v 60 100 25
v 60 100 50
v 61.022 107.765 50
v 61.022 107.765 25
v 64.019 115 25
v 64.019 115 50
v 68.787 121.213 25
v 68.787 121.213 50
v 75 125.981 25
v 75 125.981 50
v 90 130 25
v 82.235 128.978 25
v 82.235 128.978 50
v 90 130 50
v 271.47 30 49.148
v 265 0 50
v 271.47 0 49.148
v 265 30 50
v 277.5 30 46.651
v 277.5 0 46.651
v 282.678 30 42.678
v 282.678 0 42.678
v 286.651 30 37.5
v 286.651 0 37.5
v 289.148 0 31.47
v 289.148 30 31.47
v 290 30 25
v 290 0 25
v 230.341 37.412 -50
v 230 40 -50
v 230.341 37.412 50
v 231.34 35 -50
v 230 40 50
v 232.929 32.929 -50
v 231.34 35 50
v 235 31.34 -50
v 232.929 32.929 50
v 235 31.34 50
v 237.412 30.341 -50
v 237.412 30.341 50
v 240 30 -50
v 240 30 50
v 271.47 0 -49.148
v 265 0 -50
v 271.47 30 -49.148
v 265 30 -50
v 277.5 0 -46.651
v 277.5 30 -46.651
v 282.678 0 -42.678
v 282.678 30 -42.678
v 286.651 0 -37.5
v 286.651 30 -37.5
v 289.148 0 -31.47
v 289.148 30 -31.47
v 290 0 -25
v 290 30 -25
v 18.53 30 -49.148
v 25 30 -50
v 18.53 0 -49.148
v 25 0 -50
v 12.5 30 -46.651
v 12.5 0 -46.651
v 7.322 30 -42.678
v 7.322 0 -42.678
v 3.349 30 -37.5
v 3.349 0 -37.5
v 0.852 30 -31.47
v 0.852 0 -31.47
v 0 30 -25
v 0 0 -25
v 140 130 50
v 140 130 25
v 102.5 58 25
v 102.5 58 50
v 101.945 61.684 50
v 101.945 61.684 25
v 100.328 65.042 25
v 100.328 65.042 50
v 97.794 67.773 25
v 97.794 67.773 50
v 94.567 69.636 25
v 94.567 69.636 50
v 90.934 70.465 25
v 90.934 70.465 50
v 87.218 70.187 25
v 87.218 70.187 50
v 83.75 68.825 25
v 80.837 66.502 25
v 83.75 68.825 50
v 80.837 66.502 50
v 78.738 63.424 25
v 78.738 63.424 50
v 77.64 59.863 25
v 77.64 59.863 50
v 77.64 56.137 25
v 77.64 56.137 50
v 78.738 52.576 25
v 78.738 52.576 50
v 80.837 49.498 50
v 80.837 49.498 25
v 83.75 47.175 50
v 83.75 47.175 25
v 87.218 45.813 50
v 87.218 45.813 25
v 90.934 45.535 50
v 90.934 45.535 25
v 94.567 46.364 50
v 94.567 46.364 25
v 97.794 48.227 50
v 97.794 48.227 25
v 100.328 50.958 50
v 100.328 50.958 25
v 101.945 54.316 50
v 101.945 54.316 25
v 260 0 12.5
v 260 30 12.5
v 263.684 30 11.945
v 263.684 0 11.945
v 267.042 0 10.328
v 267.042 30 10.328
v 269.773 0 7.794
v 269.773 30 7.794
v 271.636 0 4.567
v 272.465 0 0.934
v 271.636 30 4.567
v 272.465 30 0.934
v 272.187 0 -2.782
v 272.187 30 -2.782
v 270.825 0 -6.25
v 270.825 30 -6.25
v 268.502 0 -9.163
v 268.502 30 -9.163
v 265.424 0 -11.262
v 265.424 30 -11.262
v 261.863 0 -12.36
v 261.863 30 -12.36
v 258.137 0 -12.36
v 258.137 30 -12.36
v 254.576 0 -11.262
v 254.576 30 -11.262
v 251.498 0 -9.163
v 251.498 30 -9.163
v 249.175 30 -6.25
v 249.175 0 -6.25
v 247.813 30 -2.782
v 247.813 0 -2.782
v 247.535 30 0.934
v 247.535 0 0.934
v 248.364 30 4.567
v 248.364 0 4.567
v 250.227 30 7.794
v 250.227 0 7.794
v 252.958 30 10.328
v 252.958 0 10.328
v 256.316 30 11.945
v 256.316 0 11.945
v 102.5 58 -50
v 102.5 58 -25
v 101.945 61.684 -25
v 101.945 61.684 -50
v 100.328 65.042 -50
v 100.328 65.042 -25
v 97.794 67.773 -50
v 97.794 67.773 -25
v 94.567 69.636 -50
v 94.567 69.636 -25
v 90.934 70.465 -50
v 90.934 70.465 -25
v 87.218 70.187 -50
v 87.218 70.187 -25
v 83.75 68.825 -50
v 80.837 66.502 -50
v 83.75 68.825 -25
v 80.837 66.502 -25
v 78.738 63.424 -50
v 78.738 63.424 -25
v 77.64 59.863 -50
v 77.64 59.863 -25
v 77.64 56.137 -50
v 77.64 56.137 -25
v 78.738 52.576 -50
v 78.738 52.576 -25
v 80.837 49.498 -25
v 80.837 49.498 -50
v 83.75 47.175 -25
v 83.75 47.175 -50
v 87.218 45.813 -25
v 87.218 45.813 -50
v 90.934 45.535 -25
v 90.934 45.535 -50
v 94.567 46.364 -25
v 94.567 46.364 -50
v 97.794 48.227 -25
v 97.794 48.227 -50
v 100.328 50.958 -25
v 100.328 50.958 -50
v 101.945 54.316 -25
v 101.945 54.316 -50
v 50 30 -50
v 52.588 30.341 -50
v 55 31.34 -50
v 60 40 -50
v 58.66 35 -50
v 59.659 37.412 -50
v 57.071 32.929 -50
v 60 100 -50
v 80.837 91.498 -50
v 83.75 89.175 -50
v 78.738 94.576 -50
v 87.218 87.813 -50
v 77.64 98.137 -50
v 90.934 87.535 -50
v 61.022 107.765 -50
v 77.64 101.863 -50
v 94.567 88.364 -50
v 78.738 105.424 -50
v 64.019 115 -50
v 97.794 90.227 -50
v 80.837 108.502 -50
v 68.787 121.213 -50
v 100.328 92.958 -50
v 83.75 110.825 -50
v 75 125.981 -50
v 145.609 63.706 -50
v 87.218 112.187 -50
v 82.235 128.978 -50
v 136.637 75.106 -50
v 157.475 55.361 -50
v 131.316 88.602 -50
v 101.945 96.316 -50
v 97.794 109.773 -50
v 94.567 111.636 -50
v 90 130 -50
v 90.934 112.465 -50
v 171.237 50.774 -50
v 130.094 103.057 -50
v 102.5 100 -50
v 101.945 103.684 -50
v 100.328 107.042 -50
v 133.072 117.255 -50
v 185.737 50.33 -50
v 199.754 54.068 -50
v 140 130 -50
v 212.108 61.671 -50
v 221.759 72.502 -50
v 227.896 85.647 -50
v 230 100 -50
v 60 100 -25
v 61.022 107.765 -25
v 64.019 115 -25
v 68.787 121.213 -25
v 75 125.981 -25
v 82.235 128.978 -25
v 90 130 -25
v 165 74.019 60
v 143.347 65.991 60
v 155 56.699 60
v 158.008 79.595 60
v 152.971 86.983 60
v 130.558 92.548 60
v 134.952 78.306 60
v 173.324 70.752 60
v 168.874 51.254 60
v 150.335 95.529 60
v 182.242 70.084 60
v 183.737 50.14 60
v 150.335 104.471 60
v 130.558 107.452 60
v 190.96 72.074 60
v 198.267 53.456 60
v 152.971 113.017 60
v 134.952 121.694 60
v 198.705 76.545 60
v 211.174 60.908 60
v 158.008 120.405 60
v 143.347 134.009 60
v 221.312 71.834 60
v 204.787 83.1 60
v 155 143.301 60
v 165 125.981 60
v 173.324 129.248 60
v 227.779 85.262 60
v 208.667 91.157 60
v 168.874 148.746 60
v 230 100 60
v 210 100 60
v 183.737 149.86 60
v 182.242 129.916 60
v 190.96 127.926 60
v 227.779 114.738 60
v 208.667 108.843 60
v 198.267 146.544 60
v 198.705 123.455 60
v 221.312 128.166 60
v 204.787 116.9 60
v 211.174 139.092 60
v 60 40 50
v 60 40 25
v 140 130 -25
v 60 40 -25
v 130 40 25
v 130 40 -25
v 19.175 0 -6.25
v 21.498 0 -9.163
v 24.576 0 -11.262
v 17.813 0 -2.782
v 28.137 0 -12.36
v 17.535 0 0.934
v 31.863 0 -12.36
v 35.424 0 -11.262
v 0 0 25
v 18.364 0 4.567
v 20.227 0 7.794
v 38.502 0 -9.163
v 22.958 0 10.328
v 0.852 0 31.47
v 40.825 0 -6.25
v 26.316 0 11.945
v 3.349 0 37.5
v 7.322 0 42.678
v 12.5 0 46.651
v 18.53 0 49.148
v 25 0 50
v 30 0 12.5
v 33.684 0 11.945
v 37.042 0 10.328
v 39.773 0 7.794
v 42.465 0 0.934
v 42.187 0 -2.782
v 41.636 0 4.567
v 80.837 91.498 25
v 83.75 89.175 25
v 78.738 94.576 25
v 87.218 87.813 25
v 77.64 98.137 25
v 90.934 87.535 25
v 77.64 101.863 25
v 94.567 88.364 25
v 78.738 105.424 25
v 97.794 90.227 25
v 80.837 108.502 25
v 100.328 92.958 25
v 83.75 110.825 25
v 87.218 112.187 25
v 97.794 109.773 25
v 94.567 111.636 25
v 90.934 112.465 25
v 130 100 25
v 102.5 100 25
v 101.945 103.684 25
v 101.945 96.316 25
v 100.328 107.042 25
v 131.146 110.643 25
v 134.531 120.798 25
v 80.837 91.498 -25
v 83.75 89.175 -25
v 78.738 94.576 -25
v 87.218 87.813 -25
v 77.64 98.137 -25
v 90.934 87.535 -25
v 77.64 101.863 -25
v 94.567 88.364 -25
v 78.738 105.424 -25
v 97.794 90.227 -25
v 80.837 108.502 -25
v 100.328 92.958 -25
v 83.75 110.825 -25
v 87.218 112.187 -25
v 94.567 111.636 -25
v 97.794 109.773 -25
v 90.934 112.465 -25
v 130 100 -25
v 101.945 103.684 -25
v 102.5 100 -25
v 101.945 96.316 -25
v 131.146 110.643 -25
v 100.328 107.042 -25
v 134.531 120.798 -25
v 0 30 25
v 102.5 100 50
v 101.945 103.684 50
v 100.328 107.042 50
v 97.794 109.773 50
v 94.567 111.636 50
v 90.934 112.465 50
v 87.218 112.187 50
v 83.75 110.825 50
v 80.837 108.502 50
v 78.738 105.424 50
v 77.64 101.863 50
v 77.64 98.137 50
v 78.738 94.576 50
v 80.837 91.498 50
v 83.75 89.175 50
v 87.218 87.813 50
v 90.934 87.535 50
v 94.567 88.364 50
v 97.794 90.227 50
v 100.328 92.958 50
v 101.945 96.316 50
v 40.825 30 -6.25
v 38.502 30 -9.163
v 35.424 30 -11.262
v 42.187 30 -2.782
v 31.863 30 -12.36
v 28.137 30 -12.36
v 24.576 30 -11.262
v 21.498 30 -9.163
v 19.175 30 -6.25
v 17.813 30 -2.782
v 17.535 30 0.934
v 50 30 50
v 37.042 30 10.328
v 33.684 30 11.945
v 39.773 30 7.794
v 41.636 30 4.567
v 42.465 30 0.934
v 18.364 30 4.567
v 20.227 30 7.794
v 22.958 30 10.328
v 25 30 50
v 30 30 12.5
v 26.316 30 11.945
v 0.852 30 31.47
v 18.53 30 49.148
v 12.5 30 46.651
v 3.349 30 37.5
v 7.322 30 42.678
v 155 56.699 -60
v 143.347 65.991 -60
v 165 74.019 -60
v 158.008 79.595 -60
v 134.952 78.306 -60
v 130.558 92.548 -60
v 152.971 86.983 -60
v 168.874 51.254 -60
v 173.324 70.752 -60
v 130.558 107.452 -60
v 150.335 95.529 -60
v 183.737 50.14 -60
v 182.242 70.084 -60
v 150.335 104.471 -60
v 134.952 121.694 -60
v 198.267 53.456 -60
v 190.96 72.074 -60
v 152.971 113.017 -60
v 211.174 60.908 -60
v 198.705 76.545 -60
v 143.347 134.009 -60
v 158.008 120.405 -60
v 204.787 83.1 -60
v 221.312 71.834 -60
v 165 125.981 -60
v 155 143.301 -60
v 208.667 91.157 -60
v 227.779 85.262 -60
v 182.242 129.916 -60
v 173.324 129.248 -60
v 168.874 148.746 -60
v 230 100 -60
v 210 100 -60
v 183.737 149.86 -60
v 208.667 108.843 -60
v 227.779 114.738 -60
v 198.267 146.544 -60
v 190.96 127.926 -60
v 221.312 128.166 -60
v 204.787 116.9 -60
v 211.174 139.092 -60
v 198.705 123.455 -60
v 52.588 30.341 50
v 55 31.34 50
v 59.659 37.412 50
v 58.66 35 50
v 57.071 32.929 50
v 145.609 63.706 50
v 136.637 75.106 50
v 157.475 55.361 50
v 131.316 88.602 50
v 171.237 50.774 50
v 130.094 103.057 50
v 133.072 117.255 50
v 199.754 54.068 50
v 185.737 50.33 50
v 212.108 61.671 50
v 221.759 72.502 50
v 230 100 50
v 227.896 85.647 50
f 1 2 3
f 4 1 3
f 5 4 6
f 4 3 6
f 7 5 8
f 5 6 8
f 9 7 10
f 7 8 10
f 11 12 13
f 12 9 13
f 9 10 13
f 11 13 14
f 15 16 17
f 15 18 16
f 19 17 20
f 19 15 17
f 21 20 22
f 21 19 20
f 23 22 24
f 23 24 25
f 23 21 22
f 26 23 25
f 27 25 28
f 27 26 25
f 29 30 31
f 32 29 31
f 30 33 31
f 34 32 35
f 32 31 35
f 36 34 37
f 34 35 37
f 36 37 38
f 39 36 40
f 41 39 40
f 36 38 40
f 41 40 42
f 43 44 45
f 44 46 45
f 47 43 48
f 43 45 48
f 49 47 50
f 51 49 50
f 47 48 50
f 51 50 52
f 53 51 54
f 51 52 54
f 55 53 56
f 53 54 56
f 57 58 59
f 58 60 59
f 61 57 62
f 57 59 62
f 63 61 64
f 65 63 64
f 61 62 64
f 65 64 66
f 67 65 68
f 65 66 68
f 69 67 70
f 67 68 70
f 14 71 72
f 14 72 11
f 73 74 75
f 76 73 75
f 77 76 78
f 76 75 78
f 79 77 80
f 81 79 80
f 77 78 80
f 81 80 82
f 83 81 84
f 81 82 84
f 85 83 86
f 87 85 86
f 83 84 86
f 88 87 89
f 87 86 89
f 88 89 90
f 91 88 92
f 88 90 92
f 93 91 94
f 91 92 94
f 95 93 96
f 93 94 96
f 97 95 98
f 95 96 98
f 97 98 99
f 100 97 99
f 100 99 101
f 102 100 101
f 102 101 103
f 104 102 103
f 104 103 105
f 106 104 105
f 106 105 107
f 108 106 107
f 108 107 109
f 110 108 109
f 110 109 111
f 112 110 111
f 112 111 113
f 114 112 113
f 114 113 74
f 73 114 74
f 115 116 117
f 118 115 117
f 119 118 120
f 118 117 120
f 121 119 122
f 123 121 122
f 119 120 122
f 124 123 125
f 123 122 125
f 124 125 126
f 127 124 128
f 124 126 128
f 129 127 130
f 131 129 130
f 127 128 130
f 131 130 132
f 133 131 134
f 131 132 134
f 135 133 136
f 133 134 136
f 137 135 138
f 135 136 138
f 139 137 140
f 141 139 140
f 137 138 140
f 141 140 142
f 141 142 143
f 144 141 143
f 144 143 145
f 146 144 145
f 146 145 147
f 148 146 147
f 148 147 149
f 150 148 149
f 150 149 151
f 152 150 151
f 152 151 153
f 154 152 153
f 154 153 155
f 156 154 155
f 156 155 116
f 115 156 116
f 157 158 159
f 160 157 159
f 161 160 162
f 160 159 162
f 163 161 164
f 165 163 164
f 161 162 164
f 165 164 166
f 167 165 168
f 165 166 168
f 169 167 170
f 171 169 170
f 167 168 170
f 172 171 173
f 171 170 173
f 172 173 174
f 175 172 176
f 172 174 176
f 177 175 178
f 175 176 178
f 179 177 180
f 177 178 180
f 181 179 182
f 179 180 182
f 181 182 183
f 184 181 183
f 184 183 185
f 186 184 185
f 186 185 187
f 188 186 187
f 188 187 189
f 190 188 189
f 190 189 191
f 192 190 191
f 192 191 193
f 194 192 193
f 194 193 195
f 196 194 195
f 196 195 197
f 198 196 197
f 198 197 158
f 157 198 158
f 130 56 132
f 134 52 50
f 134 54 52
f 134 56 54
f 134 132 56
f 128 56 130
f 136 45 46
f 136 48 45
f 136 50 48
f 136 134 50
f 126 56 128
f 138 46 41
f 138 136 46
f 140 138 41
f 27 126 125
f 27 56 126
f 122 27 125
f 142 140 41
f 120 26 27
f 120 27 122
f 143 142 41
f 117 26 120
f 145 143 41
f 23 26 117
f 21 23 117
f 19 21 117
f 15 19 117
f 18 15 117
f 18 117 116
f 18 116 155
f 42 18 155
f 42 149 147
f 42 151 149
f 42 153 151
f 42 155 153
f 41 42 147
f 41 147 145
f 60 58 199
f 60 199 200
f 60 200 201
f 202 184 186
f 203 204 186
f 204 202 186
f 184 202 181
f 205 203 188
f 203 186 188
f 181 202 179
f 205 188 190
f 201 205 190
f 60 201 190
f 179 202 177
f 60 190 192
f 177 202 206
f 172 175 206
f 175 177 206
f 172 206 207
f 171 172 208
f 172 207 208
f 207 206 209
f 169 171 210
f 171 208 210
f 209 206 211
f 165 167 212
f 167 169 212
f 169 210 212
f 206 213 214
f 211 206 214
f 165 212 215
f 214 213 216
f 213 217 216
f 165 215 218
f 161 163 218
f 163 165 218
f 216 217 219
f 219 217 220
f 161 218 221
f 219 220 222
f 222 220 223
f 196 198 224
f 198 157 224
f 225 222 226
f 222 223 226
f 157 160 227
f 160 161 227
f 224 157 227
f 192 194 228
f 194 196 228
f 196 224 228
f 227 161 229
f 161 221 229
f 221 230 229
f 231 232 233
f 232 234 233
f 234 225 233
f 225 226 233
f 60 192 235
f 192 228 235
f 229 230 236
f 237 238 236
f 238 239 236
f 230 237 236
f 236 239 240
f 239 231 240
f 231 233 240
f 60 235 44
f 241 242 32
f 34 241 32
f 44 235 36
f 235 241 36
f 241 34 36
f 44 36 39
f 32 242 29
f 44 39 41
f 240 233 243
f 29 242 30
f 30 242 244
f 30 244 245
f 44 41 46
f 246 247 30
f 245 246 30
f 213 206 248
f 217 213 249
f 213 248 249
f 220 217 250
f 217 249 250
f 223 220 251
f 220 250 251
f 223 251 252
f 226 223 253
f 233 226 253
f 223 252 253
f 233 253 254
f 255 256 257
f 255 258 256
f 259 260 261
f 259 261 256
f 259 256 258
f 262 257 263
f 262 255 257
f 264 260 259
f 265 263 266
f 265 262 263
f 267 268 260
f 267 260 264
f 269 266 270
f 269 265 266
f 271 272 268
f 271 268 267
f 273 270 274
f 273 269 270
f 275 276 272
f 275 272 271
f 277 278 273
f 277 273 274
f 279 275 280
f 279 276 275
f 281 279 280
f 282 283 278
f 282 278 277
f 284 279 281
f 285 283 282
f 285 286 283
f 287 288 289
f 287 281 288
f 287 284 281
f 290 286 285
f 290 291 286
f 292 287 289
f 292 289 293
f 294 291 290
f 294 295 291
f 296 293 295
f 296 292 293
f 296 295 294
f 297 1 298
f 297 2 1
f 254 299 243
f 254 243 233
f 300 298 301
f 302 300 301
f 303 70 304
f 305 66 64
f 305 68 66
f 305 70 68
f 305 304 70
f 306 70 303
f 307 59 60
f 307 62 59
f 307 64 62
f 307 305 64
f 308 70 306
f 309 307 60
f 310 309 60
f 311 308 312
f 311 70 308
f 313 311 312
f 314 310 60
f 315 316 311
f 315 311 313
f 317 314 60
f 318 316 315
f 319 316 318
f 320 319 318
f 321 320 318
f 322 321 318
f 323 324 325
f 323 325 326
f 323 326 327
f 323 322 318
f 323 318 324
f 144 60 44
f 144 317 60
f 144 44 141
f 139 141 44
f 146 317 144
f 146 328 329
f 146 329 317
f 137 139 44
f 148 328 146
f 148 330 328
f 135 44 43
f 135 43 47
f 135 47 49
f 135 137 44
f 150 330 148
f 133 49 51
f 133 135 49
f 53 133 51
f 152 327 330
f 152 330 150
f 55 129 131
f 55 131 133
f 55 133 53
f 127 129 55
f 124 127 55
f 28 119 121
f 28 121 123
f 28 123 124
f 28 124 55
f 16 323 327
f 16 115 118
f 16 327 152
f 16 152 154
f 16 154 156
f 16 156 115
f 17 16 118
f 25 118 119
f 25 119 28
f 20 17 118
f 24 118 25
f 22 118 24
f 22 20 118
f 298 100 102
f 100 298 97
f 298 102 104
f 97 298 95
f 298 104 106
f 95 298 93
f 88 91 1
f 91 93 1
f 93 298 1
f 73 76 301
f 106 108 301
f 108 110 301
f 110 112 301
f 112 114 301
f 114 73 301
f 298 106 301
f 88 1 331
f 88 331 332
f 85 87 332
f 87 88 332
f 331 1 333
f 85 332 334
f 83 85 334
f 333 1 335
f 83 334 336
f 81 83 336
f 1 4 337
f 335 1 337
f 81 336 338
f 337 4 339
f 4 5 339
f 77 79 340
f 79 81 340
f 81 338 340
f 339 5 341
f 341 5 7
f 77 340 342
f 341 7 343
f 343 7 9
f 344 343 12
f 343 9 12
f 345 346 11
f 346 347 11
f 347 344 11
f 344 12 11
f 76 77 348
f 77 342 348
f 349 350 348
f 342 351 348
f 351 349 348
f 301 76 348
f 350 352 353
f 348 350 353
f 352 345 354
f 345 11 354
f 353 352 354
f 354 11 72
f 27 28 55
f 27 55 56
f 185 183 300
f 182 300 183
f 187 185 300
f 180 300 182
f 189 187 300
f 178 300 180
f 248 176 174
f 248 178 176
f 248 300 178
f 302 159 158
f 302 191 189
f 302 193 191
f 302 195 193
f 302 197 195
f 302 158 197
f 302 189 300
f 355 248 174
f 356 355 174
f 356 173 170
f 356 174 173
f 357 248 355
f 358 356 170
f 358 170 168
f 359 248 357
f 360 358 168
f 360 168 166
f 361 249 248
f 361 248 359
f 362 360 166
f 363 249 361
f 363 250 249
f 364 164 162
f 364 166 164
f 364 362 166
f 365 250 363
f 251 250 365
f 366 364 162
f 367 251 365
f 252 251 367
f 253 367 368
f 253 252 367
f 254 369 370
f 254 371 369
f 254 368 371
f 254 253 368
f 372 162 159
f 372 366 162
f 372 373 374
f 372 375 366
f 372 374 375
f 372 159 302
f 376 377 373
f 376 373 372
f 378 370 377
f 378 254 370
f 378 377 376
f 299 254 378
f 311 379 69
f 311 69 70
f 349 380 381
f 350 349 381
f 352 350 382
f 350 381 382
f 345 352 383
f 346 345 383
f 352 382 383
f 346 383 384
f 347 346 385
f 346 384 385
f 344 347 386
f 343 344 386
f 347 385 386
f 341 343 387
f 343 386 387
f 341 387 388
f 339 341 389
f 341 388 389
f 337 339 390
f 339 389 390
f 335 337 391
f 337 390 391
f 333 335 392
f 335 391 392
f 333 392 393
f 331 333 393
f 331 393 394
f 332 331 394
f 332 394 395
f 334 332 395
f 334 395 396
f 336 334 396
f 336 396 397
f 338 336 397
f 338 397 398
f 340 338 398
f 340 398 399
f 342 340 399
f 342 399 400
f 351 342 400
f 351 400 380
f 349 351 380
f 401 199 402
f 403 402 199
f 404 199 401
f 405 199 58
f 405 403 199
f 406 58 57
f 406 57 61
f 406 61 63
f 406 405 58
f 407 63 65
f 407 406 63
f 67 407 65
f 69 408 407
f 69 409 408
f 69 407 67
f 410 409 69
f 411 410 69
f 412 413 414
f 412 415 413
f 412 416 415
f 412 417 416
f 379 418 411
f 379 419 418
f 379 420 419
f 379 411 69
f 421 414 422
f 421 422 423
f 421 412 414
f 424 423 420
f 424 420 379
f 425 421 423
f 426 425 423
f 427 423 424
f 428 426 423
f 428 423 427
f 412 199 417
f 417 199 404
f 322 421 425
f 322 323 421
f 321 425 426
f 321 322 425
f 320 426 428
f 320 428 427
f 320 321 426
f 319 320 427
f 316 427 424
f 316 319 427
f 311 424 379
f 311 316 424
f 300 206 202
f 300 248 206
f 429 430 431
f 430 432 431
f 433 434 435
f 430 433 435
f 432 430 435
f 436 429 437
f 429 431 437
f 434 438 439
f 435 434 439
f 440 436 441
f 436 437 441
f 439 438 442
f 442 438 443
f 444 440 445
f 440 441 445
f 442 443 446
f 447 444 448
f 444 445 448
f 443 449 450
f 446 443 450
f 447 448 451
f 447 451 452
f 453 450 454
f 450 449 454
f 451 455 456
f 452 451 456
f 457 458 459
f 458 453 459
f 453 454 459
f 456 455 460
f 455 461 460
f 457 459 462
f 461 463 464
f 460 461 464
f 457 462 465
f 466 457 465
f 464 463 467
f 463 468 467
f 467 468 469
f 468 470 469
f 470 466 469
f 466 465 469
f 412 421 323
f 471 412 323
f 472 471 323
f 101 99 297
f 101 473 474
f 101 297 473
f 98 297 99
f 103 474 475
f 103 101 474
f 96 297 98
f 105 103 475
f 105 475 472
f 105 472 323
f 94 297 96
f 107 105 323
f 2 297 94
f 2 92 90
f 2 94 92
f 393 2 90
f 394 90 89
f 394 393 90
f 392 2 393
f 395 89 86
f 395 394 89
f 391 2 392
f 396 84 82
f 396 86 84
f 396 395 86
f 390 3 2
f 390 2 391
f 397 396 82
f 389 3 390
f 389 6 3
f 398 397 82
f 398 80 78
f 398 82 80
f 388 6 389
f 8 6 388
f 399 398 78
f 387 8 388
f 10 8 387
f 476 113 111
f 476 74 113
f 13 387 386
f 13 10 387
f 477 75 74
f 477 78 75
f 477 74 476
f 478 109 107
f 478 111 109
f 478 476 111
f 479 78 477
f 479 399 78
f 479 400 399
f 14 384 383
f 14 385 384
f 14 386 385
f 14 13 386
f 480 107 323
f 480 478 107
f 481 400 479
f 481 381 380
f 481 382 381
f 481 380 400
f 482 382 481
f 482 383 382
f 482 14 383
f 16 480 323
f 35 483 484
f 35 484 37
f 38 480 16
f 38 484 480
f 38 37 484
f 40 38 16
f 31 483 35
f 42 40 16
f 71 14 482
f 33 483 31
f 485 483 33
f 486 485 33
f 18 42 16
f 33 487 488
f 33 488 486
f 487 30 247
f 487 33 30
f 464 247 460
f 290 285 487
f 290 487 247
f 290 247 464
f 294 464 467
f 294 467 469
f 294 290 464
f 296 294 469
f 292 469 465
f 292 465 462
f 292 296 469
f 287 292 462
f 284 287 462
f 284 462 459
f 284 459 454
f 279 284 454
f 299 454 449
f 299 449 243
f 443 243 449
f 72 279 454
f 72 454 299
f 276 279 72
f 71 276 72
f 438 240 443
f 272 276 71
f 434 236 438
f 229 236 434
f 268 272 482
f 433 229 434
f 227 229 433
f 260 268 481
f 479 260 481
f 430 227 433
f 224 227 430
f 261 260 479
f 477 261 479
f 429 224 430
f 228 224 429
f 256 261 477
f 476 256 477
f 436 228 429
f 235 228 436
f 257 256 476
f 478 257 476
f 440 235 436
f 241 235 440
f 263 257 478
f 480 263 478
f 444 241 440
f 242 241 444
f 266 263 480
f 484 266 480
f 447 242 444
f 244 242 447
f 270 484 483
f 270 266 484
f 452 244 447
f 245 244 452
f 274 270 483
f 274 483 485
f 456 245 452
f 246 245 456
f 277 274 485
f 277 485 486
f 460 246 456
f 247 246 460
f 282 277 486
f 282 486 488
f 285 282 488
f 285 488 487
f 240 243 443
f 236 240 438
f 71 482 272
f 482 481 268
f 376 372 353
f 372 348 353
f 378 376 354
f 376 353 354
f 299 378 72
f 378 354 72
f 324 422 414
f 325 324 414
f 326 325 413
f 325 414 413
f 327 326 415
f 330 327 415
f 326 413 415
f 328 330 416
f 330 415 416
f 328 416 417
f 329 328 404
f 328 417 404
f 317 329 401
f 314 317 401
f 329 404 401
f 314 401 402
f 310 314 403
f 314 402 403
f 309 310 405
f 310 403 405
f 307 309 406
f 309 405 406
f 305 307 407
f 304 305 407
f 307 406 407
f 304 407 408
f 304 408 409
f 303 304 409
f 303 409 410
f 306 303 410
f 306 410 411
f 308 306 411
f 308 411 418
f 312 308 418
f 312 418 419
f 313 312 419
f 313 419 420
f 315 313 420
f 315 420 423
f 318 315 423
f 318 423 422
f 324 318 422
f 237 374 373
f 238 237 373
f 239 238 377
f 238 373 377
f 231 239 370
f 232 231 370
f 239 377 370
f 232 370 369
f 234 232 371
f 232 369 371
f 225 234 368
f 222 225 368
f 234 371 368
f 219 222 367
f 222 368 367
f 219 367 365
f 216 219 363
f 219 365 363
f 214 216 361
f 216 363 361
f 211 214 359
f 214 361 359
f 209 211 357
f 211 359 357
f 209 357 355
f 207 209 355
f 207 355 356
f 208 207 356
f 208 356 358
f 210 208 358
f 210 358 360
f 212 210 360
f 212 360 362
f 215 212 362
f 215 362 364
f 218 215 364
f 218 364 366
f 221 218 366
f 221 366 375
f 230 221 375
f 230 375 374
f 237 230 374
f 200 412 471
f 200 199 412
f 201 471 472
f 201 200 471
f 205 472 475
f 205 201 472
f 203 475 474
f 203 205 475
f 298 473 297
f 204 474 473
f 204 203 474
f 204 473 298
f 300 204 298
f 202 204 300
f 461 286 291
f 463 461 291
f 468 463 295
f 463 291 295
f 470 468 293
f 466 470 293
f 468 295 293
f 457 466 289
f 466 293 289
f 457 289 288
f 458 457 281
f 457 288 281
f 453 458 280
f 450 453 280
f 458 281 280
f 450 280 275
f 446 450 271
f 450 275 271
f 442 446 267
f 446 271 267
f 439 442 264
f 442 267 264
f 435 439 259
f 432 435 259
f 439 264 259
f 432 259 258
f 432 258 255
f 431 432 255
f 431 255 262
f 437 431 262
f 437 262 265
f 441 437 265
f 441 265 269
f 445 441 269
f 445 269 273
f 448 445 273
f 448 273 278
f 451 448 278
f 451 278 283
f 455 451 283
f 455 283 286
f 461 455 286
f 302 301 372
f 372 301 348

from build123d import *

# Parameters (mm, degrees)
BOSS_EXTRUDE1_DEPTH = 50
FILLET1_R           = 30
SKETCH2_R           = 50
BOSS_EXTRUDE2_DEPTH = 60
SKETCH3_R           = 30
CUT_EXTRUDE1_DEPTH  = 121
FILLET2_R           = 10
CUT_EXTRUDE2_DEPTH  = 25
SKETCH6_R           = 12.5
CUT_EXTRUDE3_DEPTH  = 111
FILLET3_R           = 25
SKETCH10_R          = 12.5
CUT_EXTRUDE5_DEPTH  = 31


with BuildPart() as part:
    # Sketch1 → Boss-Extrude1 (new body, symmetric)
    with BuildSketch(Plane.XY):
        Polygon((0, 0), (290, 0), (290, 30), (230, 30), (230, 130), (60, 130), (60, 30), (0, 30), align=None)
    extrude(amount=BOSS_EXTRUDE1_DEPTH, both=True)

    # Fillet1
    fillet1_edges = [part.edges().sort_by_distance(p)[0] for p in [
        (60, 130, 0),
        (230, 130, 0),
    ]]
    fillet(fillet1_edges, radius=FILLET1_R)

    # Sketch2 → Boss-Extrude2 (add, symmetric)
    with BuildSketch(Plane.XY):
        with Locations((180, 100)):
            Circle(SKETCH2_R)
    extrude(amount=BOSS_EXTRUDE2_DEPTH, both=True)

    # Sketch3 → Cut-Extrude1 (cut, through all)
    with BuildSketch(Plane.XY.offset(60)):
        with Locations((180, 100)):
            Circle(SKETCH3_R)
    extrude(amount=-CUT_EXTRUDE1_DEPTH, mode=Mode.SUBTRACT)

    # Fillet2
    fillet2_edges = [part.edges().sort_by_distance(p)[0] for p in [
        (60, 30, 0),
        (230, 30, 0),
    ]]
    fillet(fillet2_edges, radius=FILLET2_R)

    # Sketch5 → Cut-Extrude2 (cut, symmetric)
    with BuildSketch(Plane.XY):
        with BuildLine():
            Line((140, 130), (60, 130))
            Line((60, 130), (60, 40))
            Line((60, 40), (130, 40))
            Line((130, 40), (130, 100))
            ThreePointArc((130, 100), (132.565835097, 115.811388301), (140, 130))
        make_face()
    extrude(amount=CUT_EXTRUDE2_DEPTH, both=True, mode=Mode.SUBTRACT)

    # Sketch6 → Cut-Extrude3 (cut, through all)
    with BuildSketch(Plane.XY.offset(50)):
        with Locations((90, 100)):
            Circle(SKETCH6_R)
        with Locations((90, 58)):
            Circle(SKETCH6_R)
    extrude(amount=-CUT_EXTRUDE3_DEPTH, mode=Mode.SUBTRACT)

    # Fillet3
    fillet3_edges = [part.edges().sort_by_distance(p)[0] for p in [
        (290, 15, 50),
        (0, 15, -50),
        (0, 15, 50),
        (290, 15, -50),
    ]]
    fillet(fillet3_edges, radius=FILLET3_R)

    # Sketch10 → Cut-Extrude5 (cut, through all)
    with BuildSketch(Plane(origin=(0, 30, 0), x_dir=(1, 0, 0), z_dir=(0, 1, 0))):
        with Locations(Location((30, 0, 0), (0, 0, 270))):  # turned: the seam where the file's is
            Circle(SKETCH10_R)
        with Locations(Location((260, 0, 0), (0, 0, 270))):  # turned: the seam where the file's is
            Circle(SKETCH10_R)
    extrude(amount=-CUT_EXTRUDE5_DEPTH, mode=Mode.SUBTRACT)


solid = part.part
